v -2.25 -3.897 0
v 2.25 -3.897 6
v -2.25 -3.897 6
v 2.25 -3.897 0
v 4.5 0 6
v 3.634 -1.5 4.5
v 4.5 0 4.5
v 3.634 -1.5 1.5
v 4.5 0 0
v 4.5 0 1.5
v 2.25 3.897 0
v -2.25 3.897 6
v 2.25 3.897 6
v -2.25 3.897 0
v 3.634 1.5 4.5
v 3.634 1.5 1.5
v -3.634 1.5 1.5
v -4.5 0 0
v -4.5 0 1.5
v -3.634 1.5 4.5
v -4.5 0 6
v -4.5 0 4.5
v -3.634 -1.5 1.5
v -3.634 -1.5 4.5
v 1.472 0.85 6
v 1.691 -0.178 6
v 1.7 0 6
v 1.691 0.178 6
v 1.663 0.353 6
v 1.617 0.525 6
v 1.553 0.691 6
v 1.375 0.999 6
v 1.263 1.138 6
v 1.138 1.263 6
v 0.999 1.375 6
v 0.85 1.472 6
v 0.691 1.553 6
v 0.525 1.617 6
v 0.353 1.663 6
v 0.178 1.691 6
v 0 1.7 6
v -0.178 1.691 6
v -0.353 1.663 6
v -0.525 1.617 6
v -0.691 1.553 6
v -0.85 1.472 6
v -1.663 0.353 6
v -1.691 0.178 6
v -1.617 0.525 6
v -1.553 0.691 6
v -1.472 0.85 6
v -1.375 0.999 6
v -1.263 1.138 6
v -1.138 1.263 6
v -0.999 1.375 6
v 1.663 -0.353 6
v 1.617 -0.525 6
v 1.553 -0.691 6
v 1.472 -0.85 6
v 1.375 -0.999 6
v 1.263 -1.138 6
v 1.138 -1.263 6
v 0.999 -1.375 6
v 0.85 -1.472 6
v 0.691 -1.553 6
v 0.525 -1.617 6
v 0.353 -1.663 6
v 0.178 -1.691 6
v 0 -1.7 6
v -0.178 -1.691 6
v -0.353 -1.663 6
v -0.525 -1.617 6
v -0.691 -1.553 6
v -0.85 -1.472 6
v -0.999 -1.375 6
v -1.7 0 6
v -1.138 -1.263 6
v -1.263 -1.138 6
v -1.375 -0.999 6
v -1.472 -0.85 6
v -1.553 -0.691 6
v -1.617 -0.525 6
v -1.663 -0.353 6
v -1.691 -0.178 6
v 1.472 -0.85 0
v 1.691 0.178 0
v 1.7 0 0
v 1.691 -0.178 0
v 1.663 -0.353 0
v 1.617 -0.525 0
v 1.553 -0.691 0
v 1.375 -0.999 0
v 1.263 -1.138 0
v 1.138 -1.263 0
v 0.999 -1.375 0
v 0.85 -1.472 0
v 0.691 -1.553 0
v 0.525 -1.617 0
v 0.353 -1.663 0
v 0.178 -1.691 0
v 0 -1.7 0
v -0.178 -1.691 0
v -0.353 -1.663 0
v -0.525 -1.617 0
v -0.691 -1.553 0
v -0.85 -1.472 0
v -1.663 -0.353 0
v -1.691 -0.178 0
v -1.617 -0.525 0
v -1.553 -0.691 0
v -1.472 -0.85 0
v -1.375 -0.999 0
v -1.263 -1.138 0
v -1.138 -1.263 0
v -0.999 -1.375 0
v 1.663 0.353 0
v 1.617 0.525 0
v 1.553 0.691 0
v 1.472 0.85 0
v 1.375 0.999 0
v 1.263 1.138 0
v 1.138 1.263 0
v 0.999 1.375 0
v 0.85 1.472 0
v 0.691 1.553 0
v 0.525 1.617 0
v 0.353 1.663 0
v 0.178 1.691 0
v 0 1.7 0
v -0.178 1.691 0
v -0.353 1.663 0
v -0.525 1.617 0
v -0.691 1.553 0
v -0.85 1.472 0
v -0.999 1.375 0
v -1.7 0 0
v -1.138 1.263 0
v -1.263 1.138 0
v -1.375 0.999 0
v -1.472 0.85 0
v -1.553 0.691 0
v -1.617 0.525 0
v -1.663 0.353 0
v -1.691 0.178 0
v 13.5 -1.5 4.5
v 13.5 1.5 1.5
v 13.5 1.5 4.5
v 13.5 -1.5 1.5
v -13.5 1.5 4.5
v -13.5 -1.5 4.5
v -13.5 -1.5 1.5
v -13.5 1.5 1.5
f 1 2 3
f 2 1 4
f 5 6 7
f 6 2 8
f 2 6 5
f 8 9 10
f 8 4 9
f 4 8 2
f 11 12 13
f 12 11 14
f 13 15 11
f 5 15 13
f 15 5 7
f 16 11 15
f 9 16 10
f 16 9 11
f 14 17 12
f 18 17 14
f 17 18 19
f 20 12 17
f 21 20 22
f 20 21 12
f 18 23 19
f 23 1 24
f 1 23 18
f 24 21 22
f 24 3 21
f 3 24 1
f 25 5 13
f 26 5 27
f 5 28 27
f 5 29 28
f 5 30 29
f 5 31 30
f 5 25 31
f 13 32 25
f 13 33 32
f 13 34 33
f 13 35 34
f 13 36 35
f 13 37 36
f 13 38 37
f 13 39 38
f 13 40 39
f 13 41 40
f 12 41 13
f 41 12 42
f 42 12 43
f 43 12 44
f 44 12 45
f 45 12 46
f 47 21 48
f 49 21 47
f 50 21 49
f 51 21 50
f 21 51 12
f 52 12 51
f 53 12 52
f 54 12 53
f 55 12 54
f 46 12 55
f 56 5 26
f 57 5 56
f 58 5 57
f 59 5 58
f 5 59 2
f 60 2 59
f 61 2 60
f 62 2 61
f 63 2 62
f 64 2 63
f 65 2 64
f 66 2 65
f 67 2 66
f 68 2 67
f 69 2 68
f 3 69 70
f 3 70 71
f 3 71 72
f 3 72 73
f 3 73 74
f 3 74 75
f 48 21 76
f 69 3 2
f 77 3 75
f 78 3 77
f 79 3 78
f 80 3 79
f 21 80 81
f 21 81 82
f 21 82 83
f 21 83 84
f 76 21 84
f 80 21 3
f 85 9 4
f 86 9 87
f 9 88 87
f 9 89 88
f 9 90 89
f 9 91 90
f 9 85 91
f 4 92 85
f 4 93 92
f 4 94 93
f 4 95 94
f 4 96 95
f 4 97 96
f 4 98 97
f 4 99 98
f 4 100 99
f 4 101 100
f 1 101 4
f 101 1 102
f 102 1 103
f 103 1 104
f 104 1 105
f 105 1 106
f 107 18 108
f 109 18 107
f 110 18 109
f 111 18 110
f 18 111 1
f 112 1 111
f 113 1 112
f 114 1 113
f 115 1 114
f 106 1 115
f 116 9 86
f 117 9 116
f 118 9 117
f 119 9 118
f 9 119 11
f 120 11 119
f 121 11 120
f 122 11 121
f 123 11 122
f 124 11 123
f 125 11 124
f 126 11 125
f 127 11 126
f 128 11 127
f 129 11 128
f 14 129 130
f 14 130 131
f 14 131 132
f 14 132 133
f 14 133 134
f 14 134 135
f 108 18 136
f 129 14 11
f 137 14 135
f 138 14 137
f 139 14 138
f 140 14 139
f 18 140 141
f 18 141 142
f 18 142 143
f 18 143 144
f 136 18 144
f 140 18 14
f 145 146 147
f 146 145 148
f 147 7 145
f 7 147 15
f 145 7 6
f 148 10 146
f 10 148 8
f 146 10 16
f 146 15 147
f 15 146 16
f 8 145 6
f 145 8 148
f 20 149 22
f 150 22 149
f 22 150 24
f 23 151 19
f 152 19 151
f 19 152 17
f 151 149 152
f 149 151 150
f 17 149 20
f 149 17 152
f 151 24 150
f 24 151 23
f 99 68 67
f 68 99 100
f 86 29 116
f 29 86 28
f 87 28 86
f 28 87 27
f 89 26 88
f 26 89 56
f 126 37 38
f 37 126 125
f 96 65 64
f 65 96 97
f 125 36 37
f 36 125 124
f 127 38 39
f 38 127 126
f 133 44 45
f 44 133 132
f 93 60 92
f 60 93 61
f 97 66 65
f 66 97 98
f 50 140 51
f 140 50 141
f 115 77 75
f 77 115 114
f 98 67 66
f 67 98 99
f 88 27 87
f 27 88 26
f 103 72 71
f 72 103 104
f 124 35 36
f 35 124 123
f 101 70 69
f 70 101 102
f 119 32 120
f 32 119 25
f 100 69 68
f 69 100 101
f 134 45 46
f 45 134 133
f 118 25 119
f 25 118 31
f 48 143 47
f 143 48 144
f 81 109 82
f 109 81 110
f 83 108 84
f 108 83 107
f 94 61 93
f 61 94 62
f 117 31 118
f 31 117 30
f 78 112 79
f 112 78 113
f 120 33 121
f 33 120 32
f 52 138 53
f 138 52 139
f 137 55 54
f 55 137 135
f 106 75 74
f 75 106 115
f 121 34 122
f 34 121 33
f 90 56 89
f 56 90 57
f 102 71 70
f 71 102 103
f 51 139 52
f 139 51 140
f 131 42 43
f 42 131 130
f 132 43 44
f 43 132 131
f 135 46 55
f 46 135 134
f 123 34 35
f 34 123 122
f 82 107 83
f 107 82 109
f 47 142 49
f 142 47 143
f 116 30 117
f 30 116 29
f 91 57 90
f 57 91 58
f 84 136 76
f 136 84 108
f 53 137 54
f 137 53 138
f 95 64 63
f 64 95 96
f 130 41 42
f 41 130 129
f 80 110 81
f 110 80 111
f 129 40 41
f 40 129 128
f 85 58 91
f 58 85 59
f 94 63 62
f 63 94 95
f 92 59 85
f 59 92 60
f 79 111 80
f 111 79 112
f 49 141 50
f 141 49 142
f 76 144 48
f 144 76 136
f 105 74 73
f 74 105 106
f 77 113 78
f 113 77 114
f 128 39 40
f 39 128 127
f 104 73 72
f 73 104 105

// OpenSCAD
// Wing nut with two reinforced wings.
$fn = 60;
eps = 0.02;
thread_d = 3.4;
body_d = 9;
body_h = 6;
wing_l = 10;
wing_t = 3;
difference() {
    union() {
        cylinder(d = body_d, h = body_h, $fn = 6);
        translate([body_d / 2 - 1, -wing_t / 2, body_h / 2 - wing_t / 2]) cube([wing_l, wing_t, wing_t]);
        translate([-body_d / 2 - wing_l + 1, -wing_t / 2, body_h / 2 - wing_t / 2]) cube([wing_l, wing_t, wing_t]);
    }
    translate([0, 0, -eps]) cylinder(d = thread_d, h = body_h + 2 * eps);
}
